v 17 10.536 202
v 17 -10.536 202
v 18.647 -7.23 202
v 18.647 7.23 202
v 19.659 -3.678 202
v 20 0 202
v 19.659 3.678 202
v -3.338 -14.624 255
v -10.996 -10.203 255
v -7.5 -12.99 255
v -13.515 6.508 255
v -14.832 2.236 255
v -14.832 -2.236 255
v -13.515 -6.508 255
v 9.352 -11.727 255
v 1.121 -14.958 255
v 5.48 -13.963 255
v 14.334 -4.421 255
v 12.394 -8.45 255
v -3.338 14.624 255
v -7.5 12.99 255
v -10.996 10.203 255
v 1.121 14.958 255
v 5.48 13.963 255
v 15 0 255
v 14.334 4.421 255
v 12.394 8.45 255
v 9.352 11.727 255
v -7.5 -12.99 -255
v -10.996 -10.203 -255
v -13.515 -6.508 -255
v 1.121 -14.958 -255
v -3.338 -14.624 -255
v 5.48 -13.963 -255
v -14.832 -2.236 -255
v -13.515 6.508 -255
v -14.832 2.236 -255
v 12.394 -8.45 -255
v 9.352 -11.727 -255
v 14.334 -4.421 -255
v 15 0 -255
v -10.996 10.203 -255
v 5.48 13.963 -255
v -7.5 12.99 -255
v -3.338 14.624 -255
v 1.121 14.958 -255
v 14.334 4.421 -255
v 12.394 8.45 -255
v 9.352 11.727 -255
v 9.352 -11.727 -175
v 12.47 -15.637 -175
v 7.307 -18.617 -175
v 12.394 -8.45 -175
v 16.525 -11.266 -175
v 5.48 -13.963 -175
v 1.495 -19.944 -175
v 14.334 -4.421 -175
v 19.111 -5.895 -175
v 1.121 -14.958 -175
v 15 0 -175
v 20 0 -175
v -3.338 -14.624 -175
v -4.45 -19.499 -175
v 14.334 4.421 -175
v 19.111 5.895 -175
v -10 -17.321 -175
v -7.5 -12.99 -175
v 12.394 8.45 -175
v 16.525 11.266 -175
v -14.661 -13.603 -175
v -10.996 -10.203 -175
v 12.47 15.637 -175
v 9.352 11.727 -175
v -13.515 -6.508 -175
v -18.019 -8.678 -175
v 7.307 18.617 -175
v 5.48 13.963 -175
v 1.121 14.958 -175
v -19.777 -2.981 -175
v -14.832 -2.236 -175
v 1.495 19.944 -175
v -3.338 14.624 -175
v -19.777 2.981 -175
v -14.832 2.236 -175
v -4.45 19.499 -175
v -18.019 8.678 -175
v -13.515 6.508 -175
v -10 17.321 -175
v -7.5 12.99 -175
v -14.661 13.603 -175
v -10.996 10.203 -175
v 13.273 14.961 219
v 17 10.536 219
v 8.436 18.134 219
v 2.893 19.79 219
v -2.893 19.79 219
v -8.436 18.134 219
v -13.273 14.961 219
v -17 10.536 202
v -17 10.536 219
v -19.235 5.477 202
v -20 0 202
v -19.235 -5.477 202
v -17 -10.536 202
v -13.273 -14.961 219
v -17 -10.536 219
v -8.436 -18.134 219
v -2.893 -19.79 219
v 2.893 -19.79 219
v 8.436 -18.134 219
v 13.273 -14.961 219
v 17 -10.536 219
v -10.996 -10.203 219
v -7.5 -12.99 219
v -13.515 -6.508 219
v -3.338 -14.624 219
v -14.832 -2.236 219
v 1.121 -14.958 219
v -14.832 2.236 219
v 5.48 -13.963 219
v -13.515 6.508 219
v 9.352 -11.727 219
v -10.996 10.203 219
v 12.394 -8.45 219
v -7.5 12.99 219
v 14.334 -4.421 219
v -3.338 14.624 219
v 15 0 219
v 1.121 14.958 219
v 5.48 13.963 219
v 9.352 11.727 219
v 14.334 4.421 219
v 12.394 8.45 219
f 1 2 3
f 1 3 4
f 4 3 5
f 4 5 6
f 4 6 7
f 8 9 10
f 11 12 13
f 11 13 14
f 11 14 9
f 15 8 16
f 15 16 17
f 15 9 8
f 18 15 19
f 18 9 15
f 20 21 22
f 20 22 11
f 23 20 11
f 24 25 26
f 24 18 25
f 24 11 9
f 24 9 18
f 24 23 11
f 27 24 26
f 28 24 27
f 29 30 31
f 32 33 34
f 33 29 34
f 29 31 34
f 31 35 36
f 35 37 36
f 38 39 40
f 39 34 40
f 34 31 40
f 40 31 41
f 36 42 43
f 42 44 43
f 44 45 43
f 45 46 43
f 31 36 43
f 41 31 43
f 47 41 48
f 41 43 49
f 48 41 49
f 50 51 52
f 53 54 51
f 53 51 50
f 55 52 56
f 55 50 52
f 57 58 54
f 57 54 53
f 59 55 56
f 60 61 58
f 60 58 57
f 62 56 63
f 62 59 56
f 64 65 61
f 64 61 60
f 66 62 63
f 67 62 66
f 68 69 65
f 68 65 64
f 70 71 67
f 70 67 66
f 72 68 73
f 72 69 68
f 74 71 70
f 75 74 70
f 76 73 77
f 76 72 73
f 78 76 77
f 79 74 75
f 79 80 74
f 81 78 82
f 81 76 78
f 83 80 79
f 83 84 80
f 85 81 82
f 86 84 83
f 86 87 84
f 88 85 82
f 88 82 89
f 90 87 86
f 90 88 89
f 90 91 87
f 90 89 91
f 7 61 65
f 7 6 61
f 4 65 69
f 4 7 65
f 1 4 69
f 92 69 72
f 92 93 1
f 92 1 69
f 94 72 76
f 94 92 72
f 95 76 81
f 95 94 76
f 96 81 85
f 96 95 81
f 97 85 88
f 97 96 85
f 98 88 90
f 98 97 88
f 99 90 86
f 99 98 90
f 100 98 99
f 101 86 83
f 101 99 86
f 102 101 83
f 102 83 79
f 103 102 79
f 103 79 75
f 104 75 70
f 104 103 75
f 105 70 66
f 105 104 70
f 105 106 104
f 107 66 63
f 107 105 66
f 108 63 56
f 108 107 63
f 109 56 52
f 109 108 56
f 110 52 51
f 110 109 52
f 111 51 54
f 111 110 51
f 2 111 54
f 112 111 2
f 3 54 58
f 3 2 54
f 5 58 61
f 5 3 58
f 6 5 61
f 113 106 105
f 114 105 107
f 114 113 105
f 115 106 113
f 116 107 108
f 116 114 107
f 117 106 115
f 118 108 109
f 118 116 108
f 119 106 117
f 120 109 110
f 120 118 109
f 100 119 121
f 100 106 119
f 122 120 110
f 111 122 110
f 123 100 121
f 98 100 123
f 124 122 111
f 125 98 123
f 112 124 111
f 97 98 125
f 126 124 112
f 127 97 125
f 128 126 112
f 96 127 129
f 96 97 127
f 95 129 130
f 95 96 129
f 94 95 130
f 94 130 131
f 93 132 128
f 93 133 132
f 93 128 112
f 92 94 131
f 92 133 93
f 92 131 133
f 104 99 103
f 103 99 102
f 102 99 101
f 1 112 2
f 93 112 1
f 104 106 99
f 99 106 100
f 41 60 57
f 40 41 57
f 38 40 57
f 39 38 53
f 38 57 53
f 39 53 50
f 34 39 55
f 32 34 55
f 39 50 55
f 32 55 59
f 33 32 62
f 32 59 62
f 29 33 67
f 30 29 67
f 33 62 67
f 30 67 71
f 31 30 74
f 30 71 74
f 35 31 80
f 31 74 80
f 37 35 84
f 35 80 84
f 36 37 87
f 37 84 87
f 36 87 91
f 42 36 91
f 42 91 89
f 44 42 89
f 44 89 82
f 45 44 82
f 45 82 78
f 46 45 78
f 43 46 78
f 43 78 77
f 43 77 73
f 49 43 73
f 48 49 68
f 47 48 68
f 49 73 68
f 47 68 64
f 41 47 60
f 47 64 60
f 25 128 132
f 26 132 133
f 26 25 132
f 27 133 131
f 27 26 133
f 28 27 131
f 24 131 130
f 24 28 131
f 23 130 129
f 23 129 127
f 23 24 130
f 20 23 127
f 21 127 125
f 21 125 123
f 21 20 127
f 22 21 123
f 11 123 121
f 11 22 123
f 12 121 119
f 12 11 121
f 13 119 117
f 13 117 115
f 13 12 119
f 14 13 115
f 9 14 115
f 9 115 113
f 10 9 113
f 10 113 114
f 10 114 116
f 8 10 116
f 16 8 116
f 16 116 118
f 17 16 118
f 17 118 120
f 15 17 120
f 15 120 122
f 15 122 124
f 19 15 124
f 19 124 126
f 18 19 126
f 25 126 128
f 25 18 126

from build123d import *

# Parameters (mm, degrees)
SKETCH1_R           = 20
BOSS_EXTRUDE1_DEPTH = 255
SKETCH2_R           = 20
SKETCH2_R_2         = 15
CUT_EXTRUDE1_DEPTH  = 36
SKETCH3_W           = 9.924415088
SKETCH3_H           = 50.469281605
SKETCH3_W_2         = 14.039416466
SKETCH3_H_2         = 45.628103513
CUT_EXTRUDE2_DEPTH  = 17
CUT_EXTRUDE4_START  = -80
SKETCH4_R           = 20
SKETCH4_R_2         = 15
CUT_EXTRUDE4_DEPTH  = 80


with BuildPart() as part:
    # Sketch1 → Boss-Extrude1 (new, symmetric)
    with BuildSketch(Plane.XY):
        Circle(SKETCH1_R)
    extrude(amount=BOSS_EXTRUDE1_DEPTH, both=True)

    # Sketch2 → Cut-Extrude1 (cut)
    with BuildSketch(Plane.XY.offset(255)):
        Circle(SKETCH2_R)
        Circle(SKETCH2_R_2, mode=Mode.SUBTRACT)
    extrude(amount=-CUT_EXTRUDE1_DEPTH, mode=Mode.SUBTRACT)

    # Sketch3 → Cut-Extrude2 (cut)
    with BuildSketch(Plane.XY.offset(219)):
        with Locations((-21.962207544, 3.05599367)):
            Rectangle(SKETCH3_W, SKETCH3_H)
        with Locations((24.019708233, 0.635404624)):
            Rectangle(SKETCH3_W_2, SKETCH3_H_2)
    extrude(amount=-CUT_EXTRUDE2_DEPTH, mode=Mode.SUBTRACT)

    # Sketch4 → Cut-Extrude4 (cut)
    with BuildSketch(Plane(origin=(0, 0, -255), x_dir=(-1, 0, 0), z_dir=(0, 0, -1)).offset(CUT_EXTRUDE4_START)):
        Circle(SKETCH4_R)
        with Locations(Location((0, 0, 0), (0, 0, 180))):
            Circle(SKETCH4_R_2, mode=Mode.SUBTRACT)
    extrude(amount=CUT_EXTRUDE4_DEPTH, mode=Mode.SUBTRACT)


solid = part.part
